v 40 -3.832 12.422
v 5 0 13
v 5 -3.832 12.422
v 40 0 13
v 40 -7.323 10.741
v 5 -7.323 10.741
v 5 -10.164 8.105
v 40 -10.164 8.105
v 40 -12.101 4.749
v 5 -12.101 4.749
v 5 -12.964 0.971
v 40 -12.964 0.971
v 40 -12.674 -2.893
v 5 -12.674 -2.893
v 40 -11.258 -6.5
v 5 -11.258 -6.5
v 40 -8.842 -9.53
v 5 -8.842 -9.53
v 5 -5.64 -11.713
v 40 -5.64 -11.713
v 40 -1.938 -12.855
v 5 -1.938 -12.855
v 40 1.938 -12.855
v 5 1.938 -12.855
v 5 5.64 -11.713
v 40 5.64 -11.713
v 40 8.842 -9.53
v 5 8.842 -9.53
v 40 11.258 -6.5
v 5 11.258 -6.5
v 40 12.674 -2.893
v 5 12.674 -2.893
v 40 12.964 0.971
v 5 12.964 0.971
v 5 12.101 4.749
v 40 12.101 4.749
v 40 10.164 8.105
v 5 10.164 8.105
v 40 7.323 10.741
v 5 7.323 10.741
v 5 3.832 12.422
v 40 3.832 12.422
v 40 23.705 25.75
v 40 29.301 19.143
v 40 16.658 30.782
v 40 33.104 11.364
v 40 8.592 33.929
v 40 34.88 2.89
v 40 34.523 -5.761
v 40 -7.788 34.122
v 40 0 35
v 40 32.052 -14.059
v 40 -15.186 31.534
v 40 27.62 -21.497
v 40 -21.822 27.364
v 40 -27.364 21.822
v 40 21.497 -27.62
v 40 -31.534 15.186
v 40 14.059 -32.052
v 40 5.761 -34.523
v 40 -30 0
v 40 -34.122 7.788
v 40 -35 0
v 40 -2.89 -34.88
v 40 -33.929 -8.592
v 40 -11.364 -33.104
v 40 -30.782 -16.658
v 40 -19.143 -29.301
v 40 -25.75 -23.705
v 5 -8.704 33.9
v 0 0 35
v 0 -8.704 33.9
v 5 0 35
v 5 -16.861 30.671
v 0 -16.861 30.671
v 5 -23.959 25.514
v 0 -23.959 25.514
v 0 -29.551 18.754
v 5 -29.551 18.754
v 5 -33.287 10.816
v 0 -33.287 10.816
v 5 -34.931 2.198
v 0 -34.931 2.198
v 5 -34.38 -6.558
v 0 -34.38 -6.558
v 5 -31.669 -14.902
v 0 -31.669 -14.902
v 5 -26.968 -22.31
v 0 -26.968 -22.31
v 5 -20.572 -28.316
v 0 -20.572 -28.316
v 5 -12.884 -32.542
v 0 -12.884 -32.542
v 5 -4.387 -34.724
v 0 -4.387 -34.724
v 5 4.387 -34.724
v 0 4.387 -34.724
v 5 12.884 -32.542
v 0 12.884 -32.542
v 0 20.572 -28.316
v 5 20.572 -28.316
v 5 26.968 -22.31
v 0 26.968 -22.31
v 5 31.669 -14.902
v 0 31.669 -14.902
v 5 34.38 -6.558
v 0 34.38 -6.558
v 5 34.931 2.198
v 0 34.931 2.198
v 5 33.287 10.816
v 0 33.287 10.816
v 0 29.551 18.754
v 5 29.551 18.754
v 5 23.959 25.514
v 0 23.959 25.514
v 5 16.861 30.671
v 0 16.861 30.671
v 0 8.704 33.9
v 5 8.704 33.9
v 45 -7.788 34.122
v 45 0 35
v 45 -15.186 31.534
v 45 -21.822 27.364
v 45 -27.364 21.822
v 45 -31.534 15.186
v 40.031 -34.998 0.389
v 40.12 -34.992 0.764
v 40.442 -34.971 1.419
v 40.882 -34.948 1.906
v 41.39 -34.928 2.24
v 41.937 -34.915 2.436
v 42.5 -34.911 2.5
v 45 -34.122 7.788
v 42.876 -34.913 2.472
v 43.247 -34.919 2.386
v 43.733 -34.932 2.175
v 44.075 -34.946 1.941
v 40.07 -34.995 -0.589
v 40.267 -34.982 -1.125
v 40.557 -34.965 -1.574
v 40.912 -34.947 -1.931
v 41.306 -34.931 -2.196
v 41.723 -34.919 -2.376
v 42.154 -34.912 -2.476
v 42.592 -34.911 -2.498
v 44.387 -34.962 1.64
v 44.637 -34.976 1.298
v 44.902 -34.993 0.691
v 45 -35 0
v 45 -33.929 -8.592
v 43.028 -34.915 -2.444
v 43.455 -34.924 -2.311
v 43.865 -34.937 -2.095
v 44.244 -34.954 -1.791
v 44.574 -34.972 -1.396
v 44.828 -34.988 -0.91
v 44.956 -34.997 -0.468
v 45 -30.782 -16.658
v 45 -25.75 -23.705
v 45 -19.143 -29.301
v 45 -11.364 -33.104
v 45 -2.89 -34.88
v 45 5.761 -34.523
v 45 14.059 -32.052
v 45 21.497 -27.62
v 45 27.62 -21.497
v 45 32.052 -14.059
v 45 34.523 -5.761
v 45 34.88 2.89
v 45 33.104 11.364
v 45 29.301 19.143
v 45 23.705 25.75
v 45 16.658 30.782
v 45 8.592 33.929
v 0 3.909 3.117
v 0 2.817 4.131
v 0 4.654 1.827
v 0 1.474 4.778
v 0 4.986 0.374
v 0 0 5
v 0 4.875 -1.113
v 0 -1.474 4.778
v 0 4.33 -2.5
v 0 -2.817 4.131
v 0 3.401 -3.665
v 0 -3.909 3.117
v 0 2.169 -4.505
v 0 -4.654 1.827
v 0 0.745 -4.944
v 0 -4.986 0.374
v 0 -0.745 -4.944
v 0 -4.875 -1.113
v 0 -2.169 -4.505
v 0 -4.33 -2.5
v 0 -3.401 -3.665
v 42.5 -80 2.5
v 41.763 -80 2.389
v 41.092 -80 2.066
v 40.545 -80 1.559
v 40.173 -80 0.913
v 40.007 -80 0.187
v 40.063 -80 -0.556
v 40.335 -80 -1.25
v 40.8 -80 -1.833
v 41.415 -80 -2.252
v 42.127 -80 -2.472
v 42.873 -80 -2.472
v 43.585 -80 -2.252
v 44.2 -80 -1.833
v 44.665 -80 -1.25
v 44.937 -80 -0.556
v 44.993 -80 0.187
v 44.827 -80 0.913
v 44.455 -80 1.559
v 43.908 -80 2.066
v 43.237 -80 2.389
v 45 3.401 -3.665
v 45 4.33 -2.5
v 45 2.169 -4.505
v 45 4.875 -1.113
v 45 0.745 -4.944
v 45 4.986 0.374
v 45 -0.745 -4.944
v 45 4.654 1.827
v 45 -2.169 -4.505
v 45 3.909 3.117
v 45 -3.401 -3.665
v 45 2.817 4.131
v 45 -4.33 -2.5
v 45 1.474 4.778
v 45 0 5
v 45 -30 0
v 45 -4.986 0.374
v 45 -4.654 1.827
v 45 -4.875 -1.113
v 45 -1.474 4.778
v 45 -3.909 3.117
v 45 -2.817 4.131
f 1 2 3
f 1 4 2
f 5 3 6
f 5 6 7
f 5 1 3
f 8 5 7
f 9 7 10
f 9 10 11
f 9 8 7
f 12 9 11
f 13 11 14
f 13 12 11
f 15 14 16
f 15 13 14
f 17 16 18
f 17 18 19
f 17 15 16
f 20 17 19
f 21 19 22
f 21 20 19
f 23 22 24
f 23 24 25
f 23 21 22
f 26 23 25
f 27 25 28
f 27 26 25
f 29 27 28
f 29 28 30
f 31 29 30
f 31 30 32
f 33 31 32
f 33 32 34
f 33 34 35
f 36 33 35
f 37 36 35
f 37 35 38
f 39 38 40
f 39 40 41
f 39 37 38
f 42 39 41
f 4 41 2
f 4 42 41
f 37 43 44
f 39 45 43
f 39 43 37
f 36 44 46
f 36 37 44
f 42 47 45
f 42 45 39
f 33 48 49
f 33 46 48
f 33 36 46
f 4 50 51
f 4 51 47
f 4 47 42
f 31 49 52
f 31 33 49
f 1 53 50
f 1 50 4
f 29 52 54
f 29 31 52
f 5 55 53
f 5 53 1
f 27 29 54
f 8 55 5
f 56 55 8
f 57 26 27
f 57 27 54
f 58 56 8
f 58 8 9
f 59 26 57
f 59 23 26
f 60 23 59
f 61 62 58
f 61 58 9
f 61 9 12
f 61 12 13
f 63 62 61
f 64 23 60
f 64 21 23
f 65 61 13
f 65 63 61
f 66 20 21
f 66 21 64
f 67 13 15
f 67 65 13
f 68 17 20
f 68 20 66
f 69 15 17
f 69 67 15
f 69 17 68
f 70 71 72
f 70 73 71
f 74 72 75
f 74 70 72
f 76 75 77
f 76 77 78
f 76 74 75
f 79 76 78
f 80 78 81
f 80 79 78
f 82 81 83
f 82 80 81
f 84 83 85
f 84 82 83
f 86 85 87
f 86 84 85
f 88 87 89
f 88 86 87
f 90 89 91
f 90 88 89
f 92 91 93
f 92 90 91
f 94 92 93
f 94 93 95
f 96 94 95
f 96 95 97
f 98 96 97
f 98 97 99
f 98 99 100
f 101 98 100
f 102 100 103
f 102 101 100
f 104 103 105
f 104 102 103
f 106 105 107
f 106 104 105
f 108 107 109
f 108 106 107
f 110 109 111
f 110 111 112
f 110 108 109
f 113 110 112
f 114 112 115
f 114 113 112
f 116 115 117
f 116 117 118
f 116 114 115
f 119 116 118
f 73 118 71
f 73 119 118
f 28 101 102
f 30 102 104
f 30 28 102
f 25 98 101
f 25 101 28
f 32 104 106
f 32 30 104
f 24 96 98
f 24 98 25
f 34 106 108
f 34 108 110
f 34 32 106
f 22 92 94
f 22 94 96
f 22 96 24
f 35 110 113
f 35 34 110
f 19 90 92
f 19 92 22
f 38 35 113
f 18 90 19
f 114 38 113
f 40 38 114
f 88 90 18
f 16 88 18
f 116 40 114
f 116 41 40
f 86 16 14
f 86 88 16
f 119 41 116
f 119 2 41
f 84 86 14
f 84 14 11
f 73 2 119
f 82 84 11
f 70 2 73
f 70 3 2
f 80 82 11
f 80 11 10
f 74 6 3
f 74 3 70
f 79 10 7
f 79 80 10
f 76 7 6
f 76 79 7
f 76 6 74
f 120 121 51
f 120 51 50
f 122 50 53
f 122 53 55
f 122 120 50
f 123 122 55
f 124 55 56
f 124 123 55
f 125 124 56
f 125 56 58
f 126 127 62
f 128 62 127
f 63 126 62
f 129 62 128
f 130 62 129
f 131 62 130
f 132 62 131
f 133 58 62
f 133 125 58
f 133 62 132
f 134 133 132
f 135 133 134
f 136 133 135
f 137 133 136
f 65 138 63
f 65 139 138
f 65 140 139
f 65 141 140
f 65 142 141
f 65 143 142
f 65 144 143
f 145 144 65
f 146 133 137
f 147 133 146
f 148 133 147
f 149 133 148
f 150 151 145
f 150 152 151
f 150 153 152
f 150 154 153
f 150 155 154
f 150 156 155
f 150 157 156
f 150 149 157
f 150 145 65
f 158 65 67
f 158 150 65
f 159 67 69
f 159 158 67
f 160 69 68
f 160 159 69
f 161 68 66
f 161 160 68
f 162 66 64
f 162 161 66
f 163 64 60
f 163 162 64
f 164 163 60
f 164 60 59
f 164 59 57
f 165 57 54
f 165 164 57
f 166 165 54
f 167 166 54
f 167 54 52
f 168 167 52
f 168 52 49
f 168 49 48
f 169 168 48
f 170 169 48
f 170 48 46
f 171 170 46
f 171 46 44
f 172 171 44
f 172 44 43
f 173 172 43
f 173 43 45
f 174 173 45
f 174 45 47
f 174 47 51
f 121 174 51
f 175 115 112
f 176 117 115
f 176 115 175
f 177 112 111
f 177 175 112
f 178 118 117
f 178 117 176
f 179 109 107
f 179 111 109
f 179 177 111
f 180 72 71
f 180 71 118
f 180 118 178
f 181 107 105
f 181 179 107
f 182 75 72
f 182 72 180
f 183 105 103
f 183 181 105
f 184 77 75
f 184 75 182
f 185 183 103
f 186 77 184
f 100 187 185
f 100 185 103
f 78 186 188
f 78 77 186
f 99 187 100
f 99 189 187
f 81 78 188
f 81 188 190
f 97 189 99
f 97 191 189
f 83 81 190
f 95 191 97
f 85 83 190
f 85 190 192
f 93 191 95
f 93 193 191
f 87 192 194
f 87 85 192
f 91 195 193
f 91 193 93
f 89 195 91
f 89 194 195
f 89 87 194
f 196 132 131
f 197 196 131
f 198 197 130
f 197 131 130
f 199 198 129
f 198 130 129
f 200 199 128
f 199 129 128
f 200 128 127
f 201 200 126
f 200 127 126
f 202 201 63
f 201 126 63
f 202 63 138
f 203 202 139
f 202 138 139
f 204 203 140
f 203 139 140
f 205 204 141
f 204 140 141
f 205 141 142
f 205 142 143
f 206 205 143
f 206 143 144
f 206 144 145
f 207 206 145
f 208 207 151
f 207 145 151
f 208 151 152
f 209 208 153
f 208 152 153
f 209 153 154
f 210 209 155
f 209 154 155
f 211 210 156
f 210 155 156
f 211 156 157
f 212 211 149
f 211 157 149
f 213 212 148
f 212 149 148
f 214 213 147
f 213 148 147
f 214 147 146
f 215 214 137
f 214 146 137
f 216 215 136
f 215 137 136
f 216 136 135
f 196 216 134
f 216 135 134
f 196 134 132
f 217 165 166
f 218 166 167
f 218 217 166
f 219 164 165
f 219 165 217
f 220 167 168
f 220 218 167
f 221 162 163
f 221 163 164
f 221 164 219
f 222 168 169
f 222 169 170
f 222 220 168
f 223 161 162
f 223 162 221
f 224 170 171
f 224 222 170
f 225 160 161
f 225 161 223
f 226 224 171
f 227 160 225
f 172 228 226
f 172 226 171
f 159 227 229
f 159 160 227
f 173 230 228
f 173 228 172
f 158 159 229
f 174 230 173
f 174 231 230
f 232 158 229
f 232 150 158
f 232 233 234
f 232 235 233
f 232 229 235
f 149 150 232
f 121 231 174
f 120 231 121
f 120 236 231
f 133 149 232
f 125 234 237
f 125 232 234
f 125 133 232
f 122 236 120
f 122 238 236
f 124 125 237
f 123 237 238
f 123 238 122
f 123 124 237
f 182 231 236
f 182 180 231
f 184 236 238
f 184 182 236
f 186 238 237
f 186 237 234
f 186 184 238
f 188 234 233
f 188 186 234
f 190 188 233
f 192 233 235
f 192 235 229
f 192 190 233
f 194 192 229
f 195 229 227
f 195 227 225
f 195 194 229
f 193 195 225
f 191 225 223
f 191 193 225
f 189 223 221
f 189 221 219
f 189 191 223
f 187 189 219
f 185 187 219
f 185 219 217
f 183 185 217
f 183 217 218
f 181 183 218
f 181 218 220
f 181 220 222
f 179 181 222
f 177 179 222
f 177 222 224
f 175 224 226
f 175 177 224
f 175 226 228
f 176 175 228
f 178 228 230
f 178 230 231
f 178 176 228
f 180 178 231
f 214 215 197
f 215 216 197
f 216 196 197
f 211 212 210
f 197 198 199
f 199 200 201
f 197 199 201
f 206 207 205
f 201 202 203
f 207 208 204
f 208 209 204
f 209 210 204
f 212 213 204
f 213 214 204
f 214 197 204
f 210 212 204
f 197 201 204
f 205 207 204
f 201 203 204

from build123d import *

# Parameters (mm, degrees)
SKIZZE3_W = 2.5
SKIZZE3_H = 50


with BuildPart() as part:
    # Skizze1 → Rotation1 (revolve)
    with BuildSketch(Plane.XY, mode=Mode.PRIVATE) as rotation1_sk:
        Polygon((0, 5), (0, 35), (5, 35), (5, 13), (40, 13), (40, 35), (45, 35), (45, 5), align=None)
    revolve(rotation1_sk.sketch.rotate(Axis((-22.629795441, 0, 0), (1, 0, 0)), 90), axis=Axis((-22.629795441, 0, 0), (1, 0, 0)))  # turned: the seam where the file's is

    # Skizze3 → Rotation2 (revolve)
    with BuildSketch(Plane(origin=(42.5, 0, 0), x_dir=(0, 0, -1), z_dir=(1, 0, 0)), mode=Mode.PRIVATE) as rotation2_sk:
        with Locations((1.25, -55)):
            Rectangle(SKIZZE3_W, SKIZZE3_H)
    revolve(rotation2_sk.sketch.rotate(Axis((42.5, -30, 0), (0, -1, 0)), 180), axis=Axis((42.5, -30, 0), (0, -1, 0)))  # turned: the seam where the file's is


solid = part.part
